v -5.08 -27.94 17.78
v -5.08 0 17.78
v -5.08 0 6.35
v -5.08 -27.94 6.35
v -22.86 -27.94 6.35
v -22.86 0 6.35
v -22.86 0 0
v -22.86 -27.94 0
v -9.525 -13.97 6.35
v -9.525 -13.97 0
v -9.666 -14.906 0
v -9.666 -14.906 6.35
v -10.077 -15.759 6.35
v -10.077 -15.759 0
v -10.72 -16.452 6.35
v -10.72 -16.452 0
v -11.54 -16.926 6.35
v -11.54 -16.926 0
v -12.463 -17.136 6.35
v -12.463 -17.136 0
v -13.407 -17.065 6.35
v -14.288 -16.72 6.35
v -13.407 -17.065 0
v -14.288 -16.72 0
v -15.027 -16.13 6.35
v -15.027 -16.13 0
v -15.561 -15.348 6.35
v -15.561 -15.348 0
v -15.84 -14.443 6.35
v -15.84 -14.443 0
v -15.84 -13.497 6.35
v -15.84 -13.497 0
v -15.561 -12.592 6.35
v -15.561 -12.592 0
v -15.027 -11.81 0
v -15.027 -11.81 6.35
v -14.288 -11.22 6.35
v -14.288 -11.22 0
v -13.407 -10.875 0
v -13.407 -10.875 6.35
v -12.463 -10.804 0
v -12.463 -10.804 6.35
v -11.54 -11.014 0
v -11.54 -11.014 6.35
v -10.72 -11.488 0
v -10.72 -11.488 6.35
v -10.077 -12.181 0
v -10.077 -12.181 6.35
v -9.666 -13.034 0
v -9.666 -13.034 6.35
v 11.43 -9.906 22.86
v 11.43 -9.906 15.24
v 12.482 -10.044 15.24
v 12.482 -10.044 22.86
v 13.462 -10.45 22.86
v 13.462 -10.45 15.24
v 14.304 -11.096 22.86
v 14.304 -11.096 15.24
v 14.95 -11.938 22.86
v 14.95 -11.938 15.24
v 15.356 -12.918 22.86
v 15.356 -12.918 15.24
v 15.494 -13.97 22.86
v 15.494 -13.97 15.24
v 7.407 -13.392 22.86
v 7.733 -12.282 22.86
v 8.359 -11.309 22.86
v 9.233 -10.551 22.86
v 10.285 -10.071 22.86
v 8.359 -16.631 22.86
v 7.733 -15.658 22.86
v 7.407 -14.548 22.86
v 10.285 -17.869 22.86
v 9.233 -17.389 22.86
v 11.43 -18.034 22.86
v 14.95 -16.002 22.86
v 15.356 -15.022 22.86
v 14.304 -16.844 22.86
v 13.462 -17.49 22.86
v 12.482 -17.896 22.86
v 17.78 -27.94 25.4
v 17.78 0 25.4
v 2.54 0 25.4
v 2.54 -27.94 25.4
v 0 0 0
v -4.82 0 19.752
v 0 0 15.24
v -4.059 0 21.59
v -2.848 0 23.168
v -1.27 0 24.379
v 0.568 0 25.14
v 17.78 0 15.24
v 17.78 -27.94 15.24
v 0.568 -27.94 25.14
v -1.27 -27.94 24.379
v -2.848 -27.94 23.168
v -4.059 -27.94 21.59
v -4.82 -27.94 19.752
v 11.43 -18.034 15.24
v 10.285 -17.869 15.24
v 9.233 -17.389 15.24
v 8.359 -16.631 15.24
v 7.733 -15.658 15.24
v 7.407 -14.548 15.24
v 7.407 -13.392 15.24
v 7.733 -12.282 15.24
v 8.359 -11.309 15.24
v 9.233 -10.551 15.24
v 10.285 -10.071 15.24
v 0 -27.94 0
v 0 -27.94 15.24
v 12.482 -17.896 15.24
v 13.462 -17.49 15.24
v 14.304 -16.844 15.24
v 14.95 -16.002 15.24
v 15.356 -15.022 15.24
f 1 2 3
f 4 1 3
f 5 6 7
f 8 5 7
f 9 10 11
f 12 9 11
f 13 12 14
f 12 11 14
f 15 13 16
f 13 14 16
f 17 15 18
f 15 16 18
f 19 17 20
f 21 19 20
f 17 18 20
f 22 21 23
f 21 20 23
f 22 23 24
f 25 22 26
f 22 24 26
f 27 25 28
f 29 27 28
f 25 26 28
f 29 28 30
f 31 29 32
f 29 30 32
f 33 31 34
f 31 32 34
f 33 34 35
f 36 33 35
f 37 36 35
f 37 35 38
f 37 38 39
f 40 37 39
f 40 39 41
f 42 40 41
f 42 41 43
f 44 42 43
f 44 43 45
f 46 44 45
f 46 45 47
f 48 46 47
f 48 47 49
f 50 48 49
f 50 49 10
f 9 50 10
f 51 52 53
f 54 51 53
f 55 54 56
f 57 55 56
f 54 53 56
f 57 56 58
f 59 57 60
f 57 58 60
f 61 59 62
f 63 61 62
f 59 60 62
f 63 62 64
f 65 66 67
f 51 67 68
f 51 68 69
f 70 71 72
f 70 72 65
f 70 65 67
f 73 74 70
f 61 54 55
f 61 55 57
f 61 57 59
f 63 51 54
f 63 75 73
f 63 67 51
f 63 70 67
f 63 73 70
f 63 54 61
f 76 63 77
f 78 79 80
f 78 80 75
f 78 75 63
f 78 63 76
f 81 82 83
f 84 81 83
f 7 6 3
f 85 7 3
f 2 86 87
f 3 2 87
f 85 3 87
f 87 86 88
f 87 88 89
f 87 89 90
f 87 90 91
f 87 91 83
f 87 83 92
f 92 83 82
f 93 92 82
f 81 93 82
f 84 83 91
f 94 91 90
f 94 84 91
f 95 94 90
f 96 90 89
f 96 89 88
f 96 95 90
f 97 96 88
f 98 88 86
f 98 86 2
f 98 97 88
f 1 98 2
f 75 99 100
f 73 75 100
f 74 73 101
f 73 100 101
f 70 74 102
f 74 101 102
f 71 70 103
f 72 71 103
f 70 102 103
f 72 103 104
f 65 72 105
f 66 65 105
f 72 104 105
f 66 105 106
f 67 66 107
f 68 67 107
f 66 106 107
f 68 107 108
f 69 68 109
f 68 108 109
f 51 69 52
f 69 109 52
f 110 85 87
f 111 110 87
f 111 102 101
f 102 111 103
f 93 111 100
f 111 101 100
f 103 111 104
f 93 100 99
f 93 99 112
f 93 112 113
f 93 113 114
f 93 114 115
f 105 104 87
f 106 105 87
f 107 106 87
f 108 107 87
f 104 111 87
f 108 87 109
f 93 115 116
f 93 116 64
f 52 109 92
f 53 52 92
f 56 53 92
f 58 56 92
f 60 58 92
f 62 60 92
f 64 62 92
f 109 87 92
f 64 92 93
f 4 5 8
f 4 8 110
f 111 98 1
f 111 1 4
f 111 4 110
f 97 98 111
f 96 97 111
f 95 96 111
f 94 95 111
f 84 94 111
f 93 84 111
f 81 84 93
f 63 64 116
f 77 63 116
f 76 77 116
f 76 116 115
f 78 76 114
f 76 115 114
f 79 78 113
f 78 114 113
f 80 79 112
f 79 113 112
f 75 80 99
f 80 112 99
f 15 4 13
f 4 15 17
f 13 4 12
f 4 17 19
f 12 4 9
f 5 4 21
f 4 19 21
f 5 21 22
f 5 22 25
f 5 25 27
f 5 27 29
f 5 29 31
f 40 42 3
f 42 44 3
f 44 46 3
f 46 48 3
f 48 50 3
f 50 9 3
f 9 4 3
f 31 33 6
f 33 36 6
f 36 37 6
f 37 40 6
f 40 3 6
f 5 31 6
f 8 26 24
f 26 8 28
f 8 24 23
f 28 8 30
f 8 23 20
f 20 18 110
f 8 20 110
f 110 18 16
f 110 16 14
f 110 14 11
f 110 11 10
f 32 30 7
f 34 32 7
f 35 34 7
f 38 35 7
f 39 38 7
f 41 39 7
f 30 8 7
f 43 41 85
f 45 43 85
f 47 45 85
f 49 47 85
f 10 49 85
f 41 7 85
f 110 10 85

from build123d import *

# Parameters (mm, degrees)
F1_DEPTH = 27.94
F3_DEPTH = 7.62
F4_R     = 7.62
F5_R     = 3.175
F6_DEPTH = 25.4


with BuildPart() as f1:
    # F0 (on Front) → F1 (new body)
    with BuildSketch(Plane.XZ):
        Polygon((-22.86, 0), (0, 0), (0, 15.24), (17.78, 15.24), (17.78, 25.4), (-5.08, 25.4), (-5.08, 6.35), (-22.86, 6.35), align=None)
    extrude(amount=F1_DEPTH)

    # F2 (on face) → F3 (cut)
    with BuildSketch(Plane(origin=(0, 0, 15.24), x_dir=(1, 0, 0), z_dir=(0, 0, -1))):
        with BuildLine():
            ThreePointArc((11.43, 9.906), (14.303682, 11.096318), (15.494, 13.97))
            ThreePointArc((15.494, 13.97), (14.303682, 16.843682), (11.43, 18.034))
            Line((11.43, 18.034), (11.43, 9.906))
        make_face()
        with BuildLine():
            Line((11.43, 9.906), (11.43, 18.034))
            ThreePointArc((11.43, 18.034), (7.366, 13.97), (11.43, 9.906))
        make_face()
    extrude(amount=-F3_DEPTH, mode=Mode.SUBTRACT)

    # F4
    f4_edges = [f1.edges().sort_by_distance(p)[0] for p in [
        (-5.08, -13.97, 25.4),
    ]]
    fillet(f4_edges, radius=F4_R)

    # F5 (on face) → F6 (cut)
    with BuildSketch(Plane(origin=(0, 0, 0), x_dir=(1, 0, 0), z_dir=(0, 0, -1))):
        with Locations((-12.7, 13.97)):
            Circle(F5_R)
    extrude(amount=-F6_DEPTH, mode=Mode.SUBTRACT)


solid = f1.part
